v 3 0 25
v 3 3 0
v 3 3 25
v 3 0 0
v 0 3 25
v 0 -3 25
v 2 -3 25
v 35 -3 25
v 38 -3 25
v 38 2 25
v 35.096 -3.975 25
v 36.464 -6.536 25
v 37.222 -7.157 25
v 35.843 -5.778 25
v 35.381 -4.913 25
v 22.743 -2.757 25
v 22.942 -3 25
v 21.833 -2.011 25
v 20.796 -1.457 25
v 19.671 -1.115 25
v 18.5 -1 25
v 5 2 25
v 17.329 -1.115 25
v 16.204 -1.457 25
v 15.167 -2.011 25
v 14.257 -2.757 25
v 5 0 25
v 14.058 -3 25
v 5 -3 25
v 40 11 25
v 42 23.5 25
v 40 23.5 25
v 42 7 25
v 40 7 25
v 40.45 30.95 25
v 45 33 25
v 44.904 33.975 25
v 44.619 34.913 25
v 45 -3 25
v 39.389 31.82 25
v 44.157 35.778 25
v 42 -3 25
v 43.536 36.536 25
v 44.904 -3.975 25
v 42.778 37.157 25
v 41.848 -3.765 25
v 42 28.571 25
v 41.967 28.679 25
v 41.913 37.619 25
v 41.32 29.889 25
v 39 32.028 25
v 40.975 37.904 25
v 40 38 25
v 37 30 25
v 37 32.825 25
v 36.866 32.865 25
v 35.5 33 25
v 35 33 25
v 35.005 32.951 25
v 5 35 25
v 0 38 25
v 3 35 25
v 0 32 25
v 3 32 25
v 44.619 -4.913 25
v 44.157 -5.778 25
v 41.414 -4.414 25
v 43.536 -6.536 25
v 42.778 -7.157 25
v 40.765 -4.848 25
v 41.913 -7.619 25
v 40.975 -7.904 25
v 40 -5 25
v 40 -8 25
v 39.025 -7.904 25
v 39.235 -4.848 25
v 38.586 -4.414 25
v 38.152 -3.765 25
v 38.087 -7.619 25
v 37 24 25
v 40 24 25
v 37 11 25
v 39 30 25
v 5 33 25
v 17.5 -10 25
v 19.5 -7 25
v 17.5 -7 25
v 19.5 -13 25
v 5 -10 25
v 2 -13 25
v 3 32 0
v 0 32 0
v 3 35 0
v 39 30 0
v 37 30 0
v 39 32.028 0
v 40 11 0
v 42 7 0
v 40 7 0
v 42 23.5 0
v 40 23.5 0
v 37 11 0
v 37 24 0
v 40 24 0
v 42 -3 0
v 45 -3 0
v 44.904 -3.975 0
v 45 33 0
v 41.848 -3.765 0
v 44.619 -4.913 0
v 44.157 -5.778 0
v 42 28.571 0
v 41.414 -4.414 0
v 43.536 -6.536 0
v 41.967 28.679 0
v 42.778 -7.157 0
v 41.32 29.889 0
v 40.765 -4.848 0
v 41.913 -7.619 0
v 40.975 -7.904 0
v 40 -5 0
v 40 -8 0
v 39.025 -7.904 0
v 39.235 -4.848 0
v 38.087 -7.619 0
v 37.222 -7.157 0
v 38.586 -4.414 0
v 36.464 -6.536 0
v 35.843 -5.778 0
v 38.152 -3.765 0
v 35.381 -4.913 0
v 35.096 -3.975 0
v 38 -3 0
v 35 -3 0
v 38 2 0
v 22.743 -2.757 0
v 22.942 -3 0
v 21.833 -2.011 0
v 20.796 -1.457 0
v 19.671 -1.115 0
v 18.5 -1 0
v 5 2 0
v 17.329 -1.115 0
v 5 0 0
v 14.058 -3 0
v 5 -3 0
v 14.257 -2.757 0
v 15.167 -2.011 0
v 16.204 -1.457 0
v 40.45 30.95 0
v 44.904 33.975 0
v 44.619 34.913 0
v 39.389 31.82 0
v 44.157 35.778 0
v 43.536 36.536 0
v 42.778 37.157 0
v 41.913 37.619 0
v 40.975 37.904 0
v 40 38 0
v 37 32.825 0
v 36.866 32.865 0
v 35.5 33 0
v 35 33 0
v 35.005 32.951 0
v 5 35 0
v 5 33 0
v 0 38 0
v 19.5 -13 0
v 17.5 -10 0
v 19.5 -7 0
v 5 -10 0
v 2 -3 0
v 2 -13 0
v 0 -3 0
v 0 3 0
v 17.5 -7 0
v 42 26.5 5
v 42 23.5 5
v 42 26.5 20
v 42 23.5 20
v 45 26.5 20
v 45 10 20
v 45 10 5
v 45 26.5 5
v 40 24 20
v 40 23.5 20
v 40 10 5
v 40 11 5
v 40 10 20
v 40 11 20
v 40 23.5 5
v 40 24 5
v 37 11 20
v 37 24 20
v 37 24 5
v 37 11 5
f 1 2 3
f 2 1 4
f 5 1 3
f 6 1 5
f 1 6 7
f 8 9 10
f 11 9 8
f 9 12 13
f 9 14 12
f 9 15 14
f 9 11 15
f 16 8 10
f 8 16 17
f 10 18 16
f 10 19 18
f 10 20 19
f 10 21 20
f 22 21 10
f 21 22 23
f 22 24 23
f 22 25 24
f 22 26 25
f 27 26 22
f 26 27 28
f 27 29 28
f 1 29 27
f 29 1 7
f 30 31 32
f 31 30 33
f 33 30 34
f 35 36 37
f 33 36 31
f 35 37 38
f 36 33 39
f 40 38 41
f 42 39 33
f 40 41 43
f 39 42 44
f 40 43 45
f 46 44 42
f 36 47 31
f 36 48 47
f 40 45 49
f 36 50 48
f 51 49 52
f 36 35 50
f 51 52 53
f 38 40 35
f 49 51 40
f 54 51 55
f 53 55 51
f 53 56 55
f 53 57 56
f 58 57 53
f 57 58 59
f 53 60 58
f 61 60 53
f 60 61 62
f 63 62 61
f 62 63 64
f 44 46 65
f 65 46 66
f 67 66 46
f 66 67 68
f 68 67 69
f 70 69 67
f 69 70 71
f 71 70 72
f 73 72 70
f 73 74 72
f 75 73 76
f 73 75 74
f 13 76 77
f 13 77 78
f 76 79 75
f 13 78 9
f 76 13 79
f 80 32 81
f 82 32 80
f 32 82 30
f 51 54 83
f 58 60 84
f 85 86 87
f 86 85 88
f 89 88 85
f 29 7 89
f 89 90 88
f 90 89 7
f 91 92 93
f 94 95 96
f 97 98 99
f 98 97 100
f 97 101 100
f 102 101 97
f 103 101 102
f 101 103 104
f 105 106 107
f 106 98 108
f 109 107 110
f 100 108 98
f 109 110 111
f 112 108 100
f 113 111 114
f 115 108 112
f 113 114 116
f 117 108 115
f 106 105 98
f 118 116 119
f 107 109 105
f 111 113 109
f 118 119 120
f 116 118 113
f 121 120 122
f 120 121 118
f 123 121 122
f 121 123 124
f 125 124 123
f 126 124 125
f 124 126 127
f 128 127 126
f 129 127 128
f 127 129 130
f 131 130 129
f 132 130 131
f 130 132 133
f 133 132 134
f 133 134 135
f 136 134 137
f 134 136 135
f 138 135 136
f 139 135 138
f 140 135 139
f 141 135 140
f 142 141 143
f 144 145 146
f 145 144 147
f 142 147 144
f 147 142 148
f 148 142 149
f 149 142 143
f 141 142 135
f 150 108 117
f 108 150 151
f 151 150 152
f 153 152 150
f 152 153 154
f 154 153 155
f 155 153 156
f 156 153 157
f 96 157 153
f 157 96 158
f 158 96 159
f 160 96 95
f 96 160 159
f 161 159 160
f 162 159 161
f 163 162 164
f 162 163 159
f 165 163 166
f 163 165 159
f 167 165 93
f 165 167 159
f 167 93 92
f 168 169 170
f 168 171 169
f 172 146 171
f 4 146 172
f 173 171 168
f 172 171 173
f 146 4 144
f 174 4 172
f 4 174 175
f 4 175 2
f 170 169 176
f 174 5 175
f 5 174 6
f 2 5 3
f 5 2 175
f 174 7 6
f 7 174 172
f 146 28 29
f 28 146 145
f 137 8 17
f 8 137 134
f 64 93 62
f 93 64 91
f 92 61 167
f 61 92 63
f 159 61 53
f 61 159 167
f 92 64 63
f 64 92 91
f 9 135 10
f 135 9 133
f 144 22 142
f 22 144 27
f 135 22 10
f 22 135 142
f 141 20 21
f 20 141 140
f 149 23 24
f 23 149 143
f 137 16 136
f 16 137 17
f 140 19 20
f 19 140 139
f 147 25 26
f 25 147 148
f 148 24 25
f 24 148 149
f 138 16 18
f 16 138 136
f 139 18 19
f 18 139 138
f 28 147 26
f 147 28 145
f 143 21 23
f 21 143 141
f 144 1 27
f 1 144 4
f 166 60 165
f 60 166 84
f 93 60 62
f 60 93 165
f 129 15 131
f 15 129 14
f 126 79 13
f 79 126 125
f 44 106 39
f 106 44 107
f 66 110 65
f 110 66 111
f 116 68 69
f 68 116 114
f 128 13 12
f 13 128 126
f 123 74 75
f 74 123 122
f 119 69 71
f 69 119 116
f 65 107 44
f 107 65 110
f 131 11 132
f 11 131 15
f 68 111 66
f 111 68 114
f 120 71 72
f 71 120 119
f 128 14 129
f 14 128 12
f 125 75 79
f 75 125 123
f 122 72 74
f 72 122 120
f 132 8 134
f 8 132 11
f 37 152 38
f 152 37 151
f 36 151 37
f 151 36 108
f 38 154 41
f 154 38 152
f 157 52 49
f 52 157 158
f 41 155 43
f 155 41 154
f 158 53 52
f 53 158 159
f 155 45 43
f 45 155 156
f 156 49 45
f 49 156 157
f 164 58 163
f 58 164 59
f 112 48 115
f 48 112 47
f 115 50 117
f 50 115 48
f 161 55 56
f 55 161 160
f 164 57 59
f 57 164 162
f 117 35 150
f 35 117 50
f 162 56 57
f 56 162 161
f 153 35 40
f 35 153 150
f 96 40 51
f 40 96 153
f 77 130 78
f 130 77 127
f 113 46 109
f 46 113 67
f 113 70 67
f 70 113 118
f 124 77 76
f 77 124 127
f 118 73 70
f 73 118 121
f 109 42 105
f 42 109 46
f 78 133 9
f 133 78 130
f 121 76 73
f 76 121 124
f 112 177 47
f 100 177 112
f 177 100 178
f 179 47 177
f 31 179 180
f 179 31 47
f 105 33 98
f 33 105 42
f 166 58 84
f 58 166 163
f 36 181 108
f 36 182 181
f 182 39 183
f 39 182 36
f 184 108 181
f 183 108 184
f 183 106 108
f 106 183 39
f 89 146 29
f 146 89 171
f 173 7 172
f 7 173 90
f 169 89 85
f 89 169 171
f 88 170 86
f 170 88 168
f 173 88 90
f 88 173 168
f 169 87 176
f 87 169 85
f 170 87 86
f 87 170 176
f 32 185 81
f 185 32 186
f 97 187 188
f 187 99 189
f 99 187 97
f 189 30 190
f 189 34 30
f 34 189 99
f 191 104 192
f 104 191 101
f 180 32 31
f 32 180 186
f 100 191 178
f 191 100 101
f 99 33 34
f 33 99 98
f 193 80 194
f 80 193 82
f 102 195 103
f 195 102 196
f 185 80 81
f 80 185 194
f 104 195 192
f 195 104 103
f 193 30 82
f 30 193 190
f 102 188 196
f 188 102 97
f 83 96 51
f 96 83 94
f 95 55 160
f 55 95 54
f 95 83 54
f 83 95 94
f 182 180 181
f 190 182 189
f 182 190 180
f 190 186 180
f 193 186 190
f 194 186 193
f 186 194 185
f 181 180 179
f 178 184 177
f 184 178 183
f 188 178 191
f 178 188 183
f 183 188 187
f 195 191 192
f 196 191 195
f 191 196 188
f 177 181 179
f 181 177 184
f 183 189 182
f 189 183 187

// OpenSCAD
// file: Cap.scad
// Author    KMS - Martin Dubois, P. Eng.
// Copyright (C) 2023 KMS
// Product   DIN
// File      Cap/Cap.scad

Cap( 30.0, 10.0 );

module Cap( aSizeX, aSizeZ )
{
    for ( y = [ - TICK, DIN_Y - TICK ] )
    {
        translate( [ 0, y, 0 ] )
            cube( [ TICK, 2 * TICK, aSizeZ ] );
    }

    translate( [ 5, DIN_Y - 2, 0 ] )
        cube( [ aSizeX, 5, aSizeZ ] );

    difference()
    {
        translate( [ 5, - TICK, 0 ] )
            cube( [ aSizeX - 2, 5, aSizeZ ] );

        translate( [ aSizeX / 2 + 1, - TICK - 4, - EPS ] )
            cylinder( 2 * EPS + aSizeZ, 6, 6, $fn = 32 );
    }

    for ( y = [ - TICK, DIN_Y ] )
    {
        translate( [ TICK, y, 0 ] )
            cube( [ 2, TICK, aSizeZ ] );
    }

    difference()
    {
        for ( y = [ - 3, DIN_Y + 3 - 5 ] )
        {
            translate( [ aSizeX + 5, y, 0 ] )
                cylinder( aSizeZ, CORNER_R, CORNER_R, $fn = 32 );
        }

        translate( [ aSizeX + 0.5, DIN_Y - 9, - EPS ] )
            cylinder( 2 * EPS + aSizeZ, 7, 7, $fn = 32 );

        translate( [ aSizeX + 5, - TICK, - EPS ] )
            cylinder( 2 * EPS + aSizeZ, 2, 2, $fn = 16 );

        translate( [ aSizeX + 5 - 2, - TICK, - EPS ] )
            cube( [ 4, 5, 2 * EPS + aSizeZ ] );
    }

    translate( [ aSizeX + 7, - TICK, 0 ] )
        cube( [ TICK, DIN_Y + 1, aSizeZ ] );

    translate( [ 2, - 10, 0 ] )
        cube( [ TICK, 7, aSizeZ ] );

    translate( [ 2, - 10 - TICK, 0 ] )
        cube( [ aSizeX / 2, TICK, aSizeZ ] );

    translate( [ aSizeX / 2, - 10, 0 ] )
        cube( [ 2, 3, aSizeZ ] );
}

// Private
// //////////////////////////////////////////////////////////////////////////

CORNER_R = 5.0;

DIN_Y = 35;

EPS = 0.1;

TICK = 3.0;
// main file
// Author    KMS - Martin Dubois, P. Eng.
// Copyright (C) 2023 KMS
// Product   DIN
// File      Cap/Keystone.scad

use <Cap.scad>

Keystone();

module Keystone()
{
    difference()
    {
        union()
        {
            Cap( SIZE_X, SIZE_Z );

            translate( [ SIZE_X + 5, 10 - TICK, 0 ] )
                cube( [ 2, KEYSTONE_Y, SIZE_Z ] );

            translate( [ SIZE_X + 2, 11, 0 ] )
                cube( [ 3, 13, SIZE_Z ] );

            translate( [ SIZE_X + 2, 30, 0 ] )
                cube( [ 2, 3, SIZE_Z ] );
        }

        translate( [ SIZE_X, 10, ( SIZE_Z - KEYSTONE_Z ) / 2 ] )
            cube( [ 11, KEYSTONE_Y, KEYSTONE_Z ] );
    }
}

// Private
// //////////////////////////////////////////////////////////////////////////

KEYSTONE_Y = 16.5;
KEYSTONE_Z = 15.0;

SIZE_X = 35.0;
SIZE_Z = 25.0;

TICK = 3;
